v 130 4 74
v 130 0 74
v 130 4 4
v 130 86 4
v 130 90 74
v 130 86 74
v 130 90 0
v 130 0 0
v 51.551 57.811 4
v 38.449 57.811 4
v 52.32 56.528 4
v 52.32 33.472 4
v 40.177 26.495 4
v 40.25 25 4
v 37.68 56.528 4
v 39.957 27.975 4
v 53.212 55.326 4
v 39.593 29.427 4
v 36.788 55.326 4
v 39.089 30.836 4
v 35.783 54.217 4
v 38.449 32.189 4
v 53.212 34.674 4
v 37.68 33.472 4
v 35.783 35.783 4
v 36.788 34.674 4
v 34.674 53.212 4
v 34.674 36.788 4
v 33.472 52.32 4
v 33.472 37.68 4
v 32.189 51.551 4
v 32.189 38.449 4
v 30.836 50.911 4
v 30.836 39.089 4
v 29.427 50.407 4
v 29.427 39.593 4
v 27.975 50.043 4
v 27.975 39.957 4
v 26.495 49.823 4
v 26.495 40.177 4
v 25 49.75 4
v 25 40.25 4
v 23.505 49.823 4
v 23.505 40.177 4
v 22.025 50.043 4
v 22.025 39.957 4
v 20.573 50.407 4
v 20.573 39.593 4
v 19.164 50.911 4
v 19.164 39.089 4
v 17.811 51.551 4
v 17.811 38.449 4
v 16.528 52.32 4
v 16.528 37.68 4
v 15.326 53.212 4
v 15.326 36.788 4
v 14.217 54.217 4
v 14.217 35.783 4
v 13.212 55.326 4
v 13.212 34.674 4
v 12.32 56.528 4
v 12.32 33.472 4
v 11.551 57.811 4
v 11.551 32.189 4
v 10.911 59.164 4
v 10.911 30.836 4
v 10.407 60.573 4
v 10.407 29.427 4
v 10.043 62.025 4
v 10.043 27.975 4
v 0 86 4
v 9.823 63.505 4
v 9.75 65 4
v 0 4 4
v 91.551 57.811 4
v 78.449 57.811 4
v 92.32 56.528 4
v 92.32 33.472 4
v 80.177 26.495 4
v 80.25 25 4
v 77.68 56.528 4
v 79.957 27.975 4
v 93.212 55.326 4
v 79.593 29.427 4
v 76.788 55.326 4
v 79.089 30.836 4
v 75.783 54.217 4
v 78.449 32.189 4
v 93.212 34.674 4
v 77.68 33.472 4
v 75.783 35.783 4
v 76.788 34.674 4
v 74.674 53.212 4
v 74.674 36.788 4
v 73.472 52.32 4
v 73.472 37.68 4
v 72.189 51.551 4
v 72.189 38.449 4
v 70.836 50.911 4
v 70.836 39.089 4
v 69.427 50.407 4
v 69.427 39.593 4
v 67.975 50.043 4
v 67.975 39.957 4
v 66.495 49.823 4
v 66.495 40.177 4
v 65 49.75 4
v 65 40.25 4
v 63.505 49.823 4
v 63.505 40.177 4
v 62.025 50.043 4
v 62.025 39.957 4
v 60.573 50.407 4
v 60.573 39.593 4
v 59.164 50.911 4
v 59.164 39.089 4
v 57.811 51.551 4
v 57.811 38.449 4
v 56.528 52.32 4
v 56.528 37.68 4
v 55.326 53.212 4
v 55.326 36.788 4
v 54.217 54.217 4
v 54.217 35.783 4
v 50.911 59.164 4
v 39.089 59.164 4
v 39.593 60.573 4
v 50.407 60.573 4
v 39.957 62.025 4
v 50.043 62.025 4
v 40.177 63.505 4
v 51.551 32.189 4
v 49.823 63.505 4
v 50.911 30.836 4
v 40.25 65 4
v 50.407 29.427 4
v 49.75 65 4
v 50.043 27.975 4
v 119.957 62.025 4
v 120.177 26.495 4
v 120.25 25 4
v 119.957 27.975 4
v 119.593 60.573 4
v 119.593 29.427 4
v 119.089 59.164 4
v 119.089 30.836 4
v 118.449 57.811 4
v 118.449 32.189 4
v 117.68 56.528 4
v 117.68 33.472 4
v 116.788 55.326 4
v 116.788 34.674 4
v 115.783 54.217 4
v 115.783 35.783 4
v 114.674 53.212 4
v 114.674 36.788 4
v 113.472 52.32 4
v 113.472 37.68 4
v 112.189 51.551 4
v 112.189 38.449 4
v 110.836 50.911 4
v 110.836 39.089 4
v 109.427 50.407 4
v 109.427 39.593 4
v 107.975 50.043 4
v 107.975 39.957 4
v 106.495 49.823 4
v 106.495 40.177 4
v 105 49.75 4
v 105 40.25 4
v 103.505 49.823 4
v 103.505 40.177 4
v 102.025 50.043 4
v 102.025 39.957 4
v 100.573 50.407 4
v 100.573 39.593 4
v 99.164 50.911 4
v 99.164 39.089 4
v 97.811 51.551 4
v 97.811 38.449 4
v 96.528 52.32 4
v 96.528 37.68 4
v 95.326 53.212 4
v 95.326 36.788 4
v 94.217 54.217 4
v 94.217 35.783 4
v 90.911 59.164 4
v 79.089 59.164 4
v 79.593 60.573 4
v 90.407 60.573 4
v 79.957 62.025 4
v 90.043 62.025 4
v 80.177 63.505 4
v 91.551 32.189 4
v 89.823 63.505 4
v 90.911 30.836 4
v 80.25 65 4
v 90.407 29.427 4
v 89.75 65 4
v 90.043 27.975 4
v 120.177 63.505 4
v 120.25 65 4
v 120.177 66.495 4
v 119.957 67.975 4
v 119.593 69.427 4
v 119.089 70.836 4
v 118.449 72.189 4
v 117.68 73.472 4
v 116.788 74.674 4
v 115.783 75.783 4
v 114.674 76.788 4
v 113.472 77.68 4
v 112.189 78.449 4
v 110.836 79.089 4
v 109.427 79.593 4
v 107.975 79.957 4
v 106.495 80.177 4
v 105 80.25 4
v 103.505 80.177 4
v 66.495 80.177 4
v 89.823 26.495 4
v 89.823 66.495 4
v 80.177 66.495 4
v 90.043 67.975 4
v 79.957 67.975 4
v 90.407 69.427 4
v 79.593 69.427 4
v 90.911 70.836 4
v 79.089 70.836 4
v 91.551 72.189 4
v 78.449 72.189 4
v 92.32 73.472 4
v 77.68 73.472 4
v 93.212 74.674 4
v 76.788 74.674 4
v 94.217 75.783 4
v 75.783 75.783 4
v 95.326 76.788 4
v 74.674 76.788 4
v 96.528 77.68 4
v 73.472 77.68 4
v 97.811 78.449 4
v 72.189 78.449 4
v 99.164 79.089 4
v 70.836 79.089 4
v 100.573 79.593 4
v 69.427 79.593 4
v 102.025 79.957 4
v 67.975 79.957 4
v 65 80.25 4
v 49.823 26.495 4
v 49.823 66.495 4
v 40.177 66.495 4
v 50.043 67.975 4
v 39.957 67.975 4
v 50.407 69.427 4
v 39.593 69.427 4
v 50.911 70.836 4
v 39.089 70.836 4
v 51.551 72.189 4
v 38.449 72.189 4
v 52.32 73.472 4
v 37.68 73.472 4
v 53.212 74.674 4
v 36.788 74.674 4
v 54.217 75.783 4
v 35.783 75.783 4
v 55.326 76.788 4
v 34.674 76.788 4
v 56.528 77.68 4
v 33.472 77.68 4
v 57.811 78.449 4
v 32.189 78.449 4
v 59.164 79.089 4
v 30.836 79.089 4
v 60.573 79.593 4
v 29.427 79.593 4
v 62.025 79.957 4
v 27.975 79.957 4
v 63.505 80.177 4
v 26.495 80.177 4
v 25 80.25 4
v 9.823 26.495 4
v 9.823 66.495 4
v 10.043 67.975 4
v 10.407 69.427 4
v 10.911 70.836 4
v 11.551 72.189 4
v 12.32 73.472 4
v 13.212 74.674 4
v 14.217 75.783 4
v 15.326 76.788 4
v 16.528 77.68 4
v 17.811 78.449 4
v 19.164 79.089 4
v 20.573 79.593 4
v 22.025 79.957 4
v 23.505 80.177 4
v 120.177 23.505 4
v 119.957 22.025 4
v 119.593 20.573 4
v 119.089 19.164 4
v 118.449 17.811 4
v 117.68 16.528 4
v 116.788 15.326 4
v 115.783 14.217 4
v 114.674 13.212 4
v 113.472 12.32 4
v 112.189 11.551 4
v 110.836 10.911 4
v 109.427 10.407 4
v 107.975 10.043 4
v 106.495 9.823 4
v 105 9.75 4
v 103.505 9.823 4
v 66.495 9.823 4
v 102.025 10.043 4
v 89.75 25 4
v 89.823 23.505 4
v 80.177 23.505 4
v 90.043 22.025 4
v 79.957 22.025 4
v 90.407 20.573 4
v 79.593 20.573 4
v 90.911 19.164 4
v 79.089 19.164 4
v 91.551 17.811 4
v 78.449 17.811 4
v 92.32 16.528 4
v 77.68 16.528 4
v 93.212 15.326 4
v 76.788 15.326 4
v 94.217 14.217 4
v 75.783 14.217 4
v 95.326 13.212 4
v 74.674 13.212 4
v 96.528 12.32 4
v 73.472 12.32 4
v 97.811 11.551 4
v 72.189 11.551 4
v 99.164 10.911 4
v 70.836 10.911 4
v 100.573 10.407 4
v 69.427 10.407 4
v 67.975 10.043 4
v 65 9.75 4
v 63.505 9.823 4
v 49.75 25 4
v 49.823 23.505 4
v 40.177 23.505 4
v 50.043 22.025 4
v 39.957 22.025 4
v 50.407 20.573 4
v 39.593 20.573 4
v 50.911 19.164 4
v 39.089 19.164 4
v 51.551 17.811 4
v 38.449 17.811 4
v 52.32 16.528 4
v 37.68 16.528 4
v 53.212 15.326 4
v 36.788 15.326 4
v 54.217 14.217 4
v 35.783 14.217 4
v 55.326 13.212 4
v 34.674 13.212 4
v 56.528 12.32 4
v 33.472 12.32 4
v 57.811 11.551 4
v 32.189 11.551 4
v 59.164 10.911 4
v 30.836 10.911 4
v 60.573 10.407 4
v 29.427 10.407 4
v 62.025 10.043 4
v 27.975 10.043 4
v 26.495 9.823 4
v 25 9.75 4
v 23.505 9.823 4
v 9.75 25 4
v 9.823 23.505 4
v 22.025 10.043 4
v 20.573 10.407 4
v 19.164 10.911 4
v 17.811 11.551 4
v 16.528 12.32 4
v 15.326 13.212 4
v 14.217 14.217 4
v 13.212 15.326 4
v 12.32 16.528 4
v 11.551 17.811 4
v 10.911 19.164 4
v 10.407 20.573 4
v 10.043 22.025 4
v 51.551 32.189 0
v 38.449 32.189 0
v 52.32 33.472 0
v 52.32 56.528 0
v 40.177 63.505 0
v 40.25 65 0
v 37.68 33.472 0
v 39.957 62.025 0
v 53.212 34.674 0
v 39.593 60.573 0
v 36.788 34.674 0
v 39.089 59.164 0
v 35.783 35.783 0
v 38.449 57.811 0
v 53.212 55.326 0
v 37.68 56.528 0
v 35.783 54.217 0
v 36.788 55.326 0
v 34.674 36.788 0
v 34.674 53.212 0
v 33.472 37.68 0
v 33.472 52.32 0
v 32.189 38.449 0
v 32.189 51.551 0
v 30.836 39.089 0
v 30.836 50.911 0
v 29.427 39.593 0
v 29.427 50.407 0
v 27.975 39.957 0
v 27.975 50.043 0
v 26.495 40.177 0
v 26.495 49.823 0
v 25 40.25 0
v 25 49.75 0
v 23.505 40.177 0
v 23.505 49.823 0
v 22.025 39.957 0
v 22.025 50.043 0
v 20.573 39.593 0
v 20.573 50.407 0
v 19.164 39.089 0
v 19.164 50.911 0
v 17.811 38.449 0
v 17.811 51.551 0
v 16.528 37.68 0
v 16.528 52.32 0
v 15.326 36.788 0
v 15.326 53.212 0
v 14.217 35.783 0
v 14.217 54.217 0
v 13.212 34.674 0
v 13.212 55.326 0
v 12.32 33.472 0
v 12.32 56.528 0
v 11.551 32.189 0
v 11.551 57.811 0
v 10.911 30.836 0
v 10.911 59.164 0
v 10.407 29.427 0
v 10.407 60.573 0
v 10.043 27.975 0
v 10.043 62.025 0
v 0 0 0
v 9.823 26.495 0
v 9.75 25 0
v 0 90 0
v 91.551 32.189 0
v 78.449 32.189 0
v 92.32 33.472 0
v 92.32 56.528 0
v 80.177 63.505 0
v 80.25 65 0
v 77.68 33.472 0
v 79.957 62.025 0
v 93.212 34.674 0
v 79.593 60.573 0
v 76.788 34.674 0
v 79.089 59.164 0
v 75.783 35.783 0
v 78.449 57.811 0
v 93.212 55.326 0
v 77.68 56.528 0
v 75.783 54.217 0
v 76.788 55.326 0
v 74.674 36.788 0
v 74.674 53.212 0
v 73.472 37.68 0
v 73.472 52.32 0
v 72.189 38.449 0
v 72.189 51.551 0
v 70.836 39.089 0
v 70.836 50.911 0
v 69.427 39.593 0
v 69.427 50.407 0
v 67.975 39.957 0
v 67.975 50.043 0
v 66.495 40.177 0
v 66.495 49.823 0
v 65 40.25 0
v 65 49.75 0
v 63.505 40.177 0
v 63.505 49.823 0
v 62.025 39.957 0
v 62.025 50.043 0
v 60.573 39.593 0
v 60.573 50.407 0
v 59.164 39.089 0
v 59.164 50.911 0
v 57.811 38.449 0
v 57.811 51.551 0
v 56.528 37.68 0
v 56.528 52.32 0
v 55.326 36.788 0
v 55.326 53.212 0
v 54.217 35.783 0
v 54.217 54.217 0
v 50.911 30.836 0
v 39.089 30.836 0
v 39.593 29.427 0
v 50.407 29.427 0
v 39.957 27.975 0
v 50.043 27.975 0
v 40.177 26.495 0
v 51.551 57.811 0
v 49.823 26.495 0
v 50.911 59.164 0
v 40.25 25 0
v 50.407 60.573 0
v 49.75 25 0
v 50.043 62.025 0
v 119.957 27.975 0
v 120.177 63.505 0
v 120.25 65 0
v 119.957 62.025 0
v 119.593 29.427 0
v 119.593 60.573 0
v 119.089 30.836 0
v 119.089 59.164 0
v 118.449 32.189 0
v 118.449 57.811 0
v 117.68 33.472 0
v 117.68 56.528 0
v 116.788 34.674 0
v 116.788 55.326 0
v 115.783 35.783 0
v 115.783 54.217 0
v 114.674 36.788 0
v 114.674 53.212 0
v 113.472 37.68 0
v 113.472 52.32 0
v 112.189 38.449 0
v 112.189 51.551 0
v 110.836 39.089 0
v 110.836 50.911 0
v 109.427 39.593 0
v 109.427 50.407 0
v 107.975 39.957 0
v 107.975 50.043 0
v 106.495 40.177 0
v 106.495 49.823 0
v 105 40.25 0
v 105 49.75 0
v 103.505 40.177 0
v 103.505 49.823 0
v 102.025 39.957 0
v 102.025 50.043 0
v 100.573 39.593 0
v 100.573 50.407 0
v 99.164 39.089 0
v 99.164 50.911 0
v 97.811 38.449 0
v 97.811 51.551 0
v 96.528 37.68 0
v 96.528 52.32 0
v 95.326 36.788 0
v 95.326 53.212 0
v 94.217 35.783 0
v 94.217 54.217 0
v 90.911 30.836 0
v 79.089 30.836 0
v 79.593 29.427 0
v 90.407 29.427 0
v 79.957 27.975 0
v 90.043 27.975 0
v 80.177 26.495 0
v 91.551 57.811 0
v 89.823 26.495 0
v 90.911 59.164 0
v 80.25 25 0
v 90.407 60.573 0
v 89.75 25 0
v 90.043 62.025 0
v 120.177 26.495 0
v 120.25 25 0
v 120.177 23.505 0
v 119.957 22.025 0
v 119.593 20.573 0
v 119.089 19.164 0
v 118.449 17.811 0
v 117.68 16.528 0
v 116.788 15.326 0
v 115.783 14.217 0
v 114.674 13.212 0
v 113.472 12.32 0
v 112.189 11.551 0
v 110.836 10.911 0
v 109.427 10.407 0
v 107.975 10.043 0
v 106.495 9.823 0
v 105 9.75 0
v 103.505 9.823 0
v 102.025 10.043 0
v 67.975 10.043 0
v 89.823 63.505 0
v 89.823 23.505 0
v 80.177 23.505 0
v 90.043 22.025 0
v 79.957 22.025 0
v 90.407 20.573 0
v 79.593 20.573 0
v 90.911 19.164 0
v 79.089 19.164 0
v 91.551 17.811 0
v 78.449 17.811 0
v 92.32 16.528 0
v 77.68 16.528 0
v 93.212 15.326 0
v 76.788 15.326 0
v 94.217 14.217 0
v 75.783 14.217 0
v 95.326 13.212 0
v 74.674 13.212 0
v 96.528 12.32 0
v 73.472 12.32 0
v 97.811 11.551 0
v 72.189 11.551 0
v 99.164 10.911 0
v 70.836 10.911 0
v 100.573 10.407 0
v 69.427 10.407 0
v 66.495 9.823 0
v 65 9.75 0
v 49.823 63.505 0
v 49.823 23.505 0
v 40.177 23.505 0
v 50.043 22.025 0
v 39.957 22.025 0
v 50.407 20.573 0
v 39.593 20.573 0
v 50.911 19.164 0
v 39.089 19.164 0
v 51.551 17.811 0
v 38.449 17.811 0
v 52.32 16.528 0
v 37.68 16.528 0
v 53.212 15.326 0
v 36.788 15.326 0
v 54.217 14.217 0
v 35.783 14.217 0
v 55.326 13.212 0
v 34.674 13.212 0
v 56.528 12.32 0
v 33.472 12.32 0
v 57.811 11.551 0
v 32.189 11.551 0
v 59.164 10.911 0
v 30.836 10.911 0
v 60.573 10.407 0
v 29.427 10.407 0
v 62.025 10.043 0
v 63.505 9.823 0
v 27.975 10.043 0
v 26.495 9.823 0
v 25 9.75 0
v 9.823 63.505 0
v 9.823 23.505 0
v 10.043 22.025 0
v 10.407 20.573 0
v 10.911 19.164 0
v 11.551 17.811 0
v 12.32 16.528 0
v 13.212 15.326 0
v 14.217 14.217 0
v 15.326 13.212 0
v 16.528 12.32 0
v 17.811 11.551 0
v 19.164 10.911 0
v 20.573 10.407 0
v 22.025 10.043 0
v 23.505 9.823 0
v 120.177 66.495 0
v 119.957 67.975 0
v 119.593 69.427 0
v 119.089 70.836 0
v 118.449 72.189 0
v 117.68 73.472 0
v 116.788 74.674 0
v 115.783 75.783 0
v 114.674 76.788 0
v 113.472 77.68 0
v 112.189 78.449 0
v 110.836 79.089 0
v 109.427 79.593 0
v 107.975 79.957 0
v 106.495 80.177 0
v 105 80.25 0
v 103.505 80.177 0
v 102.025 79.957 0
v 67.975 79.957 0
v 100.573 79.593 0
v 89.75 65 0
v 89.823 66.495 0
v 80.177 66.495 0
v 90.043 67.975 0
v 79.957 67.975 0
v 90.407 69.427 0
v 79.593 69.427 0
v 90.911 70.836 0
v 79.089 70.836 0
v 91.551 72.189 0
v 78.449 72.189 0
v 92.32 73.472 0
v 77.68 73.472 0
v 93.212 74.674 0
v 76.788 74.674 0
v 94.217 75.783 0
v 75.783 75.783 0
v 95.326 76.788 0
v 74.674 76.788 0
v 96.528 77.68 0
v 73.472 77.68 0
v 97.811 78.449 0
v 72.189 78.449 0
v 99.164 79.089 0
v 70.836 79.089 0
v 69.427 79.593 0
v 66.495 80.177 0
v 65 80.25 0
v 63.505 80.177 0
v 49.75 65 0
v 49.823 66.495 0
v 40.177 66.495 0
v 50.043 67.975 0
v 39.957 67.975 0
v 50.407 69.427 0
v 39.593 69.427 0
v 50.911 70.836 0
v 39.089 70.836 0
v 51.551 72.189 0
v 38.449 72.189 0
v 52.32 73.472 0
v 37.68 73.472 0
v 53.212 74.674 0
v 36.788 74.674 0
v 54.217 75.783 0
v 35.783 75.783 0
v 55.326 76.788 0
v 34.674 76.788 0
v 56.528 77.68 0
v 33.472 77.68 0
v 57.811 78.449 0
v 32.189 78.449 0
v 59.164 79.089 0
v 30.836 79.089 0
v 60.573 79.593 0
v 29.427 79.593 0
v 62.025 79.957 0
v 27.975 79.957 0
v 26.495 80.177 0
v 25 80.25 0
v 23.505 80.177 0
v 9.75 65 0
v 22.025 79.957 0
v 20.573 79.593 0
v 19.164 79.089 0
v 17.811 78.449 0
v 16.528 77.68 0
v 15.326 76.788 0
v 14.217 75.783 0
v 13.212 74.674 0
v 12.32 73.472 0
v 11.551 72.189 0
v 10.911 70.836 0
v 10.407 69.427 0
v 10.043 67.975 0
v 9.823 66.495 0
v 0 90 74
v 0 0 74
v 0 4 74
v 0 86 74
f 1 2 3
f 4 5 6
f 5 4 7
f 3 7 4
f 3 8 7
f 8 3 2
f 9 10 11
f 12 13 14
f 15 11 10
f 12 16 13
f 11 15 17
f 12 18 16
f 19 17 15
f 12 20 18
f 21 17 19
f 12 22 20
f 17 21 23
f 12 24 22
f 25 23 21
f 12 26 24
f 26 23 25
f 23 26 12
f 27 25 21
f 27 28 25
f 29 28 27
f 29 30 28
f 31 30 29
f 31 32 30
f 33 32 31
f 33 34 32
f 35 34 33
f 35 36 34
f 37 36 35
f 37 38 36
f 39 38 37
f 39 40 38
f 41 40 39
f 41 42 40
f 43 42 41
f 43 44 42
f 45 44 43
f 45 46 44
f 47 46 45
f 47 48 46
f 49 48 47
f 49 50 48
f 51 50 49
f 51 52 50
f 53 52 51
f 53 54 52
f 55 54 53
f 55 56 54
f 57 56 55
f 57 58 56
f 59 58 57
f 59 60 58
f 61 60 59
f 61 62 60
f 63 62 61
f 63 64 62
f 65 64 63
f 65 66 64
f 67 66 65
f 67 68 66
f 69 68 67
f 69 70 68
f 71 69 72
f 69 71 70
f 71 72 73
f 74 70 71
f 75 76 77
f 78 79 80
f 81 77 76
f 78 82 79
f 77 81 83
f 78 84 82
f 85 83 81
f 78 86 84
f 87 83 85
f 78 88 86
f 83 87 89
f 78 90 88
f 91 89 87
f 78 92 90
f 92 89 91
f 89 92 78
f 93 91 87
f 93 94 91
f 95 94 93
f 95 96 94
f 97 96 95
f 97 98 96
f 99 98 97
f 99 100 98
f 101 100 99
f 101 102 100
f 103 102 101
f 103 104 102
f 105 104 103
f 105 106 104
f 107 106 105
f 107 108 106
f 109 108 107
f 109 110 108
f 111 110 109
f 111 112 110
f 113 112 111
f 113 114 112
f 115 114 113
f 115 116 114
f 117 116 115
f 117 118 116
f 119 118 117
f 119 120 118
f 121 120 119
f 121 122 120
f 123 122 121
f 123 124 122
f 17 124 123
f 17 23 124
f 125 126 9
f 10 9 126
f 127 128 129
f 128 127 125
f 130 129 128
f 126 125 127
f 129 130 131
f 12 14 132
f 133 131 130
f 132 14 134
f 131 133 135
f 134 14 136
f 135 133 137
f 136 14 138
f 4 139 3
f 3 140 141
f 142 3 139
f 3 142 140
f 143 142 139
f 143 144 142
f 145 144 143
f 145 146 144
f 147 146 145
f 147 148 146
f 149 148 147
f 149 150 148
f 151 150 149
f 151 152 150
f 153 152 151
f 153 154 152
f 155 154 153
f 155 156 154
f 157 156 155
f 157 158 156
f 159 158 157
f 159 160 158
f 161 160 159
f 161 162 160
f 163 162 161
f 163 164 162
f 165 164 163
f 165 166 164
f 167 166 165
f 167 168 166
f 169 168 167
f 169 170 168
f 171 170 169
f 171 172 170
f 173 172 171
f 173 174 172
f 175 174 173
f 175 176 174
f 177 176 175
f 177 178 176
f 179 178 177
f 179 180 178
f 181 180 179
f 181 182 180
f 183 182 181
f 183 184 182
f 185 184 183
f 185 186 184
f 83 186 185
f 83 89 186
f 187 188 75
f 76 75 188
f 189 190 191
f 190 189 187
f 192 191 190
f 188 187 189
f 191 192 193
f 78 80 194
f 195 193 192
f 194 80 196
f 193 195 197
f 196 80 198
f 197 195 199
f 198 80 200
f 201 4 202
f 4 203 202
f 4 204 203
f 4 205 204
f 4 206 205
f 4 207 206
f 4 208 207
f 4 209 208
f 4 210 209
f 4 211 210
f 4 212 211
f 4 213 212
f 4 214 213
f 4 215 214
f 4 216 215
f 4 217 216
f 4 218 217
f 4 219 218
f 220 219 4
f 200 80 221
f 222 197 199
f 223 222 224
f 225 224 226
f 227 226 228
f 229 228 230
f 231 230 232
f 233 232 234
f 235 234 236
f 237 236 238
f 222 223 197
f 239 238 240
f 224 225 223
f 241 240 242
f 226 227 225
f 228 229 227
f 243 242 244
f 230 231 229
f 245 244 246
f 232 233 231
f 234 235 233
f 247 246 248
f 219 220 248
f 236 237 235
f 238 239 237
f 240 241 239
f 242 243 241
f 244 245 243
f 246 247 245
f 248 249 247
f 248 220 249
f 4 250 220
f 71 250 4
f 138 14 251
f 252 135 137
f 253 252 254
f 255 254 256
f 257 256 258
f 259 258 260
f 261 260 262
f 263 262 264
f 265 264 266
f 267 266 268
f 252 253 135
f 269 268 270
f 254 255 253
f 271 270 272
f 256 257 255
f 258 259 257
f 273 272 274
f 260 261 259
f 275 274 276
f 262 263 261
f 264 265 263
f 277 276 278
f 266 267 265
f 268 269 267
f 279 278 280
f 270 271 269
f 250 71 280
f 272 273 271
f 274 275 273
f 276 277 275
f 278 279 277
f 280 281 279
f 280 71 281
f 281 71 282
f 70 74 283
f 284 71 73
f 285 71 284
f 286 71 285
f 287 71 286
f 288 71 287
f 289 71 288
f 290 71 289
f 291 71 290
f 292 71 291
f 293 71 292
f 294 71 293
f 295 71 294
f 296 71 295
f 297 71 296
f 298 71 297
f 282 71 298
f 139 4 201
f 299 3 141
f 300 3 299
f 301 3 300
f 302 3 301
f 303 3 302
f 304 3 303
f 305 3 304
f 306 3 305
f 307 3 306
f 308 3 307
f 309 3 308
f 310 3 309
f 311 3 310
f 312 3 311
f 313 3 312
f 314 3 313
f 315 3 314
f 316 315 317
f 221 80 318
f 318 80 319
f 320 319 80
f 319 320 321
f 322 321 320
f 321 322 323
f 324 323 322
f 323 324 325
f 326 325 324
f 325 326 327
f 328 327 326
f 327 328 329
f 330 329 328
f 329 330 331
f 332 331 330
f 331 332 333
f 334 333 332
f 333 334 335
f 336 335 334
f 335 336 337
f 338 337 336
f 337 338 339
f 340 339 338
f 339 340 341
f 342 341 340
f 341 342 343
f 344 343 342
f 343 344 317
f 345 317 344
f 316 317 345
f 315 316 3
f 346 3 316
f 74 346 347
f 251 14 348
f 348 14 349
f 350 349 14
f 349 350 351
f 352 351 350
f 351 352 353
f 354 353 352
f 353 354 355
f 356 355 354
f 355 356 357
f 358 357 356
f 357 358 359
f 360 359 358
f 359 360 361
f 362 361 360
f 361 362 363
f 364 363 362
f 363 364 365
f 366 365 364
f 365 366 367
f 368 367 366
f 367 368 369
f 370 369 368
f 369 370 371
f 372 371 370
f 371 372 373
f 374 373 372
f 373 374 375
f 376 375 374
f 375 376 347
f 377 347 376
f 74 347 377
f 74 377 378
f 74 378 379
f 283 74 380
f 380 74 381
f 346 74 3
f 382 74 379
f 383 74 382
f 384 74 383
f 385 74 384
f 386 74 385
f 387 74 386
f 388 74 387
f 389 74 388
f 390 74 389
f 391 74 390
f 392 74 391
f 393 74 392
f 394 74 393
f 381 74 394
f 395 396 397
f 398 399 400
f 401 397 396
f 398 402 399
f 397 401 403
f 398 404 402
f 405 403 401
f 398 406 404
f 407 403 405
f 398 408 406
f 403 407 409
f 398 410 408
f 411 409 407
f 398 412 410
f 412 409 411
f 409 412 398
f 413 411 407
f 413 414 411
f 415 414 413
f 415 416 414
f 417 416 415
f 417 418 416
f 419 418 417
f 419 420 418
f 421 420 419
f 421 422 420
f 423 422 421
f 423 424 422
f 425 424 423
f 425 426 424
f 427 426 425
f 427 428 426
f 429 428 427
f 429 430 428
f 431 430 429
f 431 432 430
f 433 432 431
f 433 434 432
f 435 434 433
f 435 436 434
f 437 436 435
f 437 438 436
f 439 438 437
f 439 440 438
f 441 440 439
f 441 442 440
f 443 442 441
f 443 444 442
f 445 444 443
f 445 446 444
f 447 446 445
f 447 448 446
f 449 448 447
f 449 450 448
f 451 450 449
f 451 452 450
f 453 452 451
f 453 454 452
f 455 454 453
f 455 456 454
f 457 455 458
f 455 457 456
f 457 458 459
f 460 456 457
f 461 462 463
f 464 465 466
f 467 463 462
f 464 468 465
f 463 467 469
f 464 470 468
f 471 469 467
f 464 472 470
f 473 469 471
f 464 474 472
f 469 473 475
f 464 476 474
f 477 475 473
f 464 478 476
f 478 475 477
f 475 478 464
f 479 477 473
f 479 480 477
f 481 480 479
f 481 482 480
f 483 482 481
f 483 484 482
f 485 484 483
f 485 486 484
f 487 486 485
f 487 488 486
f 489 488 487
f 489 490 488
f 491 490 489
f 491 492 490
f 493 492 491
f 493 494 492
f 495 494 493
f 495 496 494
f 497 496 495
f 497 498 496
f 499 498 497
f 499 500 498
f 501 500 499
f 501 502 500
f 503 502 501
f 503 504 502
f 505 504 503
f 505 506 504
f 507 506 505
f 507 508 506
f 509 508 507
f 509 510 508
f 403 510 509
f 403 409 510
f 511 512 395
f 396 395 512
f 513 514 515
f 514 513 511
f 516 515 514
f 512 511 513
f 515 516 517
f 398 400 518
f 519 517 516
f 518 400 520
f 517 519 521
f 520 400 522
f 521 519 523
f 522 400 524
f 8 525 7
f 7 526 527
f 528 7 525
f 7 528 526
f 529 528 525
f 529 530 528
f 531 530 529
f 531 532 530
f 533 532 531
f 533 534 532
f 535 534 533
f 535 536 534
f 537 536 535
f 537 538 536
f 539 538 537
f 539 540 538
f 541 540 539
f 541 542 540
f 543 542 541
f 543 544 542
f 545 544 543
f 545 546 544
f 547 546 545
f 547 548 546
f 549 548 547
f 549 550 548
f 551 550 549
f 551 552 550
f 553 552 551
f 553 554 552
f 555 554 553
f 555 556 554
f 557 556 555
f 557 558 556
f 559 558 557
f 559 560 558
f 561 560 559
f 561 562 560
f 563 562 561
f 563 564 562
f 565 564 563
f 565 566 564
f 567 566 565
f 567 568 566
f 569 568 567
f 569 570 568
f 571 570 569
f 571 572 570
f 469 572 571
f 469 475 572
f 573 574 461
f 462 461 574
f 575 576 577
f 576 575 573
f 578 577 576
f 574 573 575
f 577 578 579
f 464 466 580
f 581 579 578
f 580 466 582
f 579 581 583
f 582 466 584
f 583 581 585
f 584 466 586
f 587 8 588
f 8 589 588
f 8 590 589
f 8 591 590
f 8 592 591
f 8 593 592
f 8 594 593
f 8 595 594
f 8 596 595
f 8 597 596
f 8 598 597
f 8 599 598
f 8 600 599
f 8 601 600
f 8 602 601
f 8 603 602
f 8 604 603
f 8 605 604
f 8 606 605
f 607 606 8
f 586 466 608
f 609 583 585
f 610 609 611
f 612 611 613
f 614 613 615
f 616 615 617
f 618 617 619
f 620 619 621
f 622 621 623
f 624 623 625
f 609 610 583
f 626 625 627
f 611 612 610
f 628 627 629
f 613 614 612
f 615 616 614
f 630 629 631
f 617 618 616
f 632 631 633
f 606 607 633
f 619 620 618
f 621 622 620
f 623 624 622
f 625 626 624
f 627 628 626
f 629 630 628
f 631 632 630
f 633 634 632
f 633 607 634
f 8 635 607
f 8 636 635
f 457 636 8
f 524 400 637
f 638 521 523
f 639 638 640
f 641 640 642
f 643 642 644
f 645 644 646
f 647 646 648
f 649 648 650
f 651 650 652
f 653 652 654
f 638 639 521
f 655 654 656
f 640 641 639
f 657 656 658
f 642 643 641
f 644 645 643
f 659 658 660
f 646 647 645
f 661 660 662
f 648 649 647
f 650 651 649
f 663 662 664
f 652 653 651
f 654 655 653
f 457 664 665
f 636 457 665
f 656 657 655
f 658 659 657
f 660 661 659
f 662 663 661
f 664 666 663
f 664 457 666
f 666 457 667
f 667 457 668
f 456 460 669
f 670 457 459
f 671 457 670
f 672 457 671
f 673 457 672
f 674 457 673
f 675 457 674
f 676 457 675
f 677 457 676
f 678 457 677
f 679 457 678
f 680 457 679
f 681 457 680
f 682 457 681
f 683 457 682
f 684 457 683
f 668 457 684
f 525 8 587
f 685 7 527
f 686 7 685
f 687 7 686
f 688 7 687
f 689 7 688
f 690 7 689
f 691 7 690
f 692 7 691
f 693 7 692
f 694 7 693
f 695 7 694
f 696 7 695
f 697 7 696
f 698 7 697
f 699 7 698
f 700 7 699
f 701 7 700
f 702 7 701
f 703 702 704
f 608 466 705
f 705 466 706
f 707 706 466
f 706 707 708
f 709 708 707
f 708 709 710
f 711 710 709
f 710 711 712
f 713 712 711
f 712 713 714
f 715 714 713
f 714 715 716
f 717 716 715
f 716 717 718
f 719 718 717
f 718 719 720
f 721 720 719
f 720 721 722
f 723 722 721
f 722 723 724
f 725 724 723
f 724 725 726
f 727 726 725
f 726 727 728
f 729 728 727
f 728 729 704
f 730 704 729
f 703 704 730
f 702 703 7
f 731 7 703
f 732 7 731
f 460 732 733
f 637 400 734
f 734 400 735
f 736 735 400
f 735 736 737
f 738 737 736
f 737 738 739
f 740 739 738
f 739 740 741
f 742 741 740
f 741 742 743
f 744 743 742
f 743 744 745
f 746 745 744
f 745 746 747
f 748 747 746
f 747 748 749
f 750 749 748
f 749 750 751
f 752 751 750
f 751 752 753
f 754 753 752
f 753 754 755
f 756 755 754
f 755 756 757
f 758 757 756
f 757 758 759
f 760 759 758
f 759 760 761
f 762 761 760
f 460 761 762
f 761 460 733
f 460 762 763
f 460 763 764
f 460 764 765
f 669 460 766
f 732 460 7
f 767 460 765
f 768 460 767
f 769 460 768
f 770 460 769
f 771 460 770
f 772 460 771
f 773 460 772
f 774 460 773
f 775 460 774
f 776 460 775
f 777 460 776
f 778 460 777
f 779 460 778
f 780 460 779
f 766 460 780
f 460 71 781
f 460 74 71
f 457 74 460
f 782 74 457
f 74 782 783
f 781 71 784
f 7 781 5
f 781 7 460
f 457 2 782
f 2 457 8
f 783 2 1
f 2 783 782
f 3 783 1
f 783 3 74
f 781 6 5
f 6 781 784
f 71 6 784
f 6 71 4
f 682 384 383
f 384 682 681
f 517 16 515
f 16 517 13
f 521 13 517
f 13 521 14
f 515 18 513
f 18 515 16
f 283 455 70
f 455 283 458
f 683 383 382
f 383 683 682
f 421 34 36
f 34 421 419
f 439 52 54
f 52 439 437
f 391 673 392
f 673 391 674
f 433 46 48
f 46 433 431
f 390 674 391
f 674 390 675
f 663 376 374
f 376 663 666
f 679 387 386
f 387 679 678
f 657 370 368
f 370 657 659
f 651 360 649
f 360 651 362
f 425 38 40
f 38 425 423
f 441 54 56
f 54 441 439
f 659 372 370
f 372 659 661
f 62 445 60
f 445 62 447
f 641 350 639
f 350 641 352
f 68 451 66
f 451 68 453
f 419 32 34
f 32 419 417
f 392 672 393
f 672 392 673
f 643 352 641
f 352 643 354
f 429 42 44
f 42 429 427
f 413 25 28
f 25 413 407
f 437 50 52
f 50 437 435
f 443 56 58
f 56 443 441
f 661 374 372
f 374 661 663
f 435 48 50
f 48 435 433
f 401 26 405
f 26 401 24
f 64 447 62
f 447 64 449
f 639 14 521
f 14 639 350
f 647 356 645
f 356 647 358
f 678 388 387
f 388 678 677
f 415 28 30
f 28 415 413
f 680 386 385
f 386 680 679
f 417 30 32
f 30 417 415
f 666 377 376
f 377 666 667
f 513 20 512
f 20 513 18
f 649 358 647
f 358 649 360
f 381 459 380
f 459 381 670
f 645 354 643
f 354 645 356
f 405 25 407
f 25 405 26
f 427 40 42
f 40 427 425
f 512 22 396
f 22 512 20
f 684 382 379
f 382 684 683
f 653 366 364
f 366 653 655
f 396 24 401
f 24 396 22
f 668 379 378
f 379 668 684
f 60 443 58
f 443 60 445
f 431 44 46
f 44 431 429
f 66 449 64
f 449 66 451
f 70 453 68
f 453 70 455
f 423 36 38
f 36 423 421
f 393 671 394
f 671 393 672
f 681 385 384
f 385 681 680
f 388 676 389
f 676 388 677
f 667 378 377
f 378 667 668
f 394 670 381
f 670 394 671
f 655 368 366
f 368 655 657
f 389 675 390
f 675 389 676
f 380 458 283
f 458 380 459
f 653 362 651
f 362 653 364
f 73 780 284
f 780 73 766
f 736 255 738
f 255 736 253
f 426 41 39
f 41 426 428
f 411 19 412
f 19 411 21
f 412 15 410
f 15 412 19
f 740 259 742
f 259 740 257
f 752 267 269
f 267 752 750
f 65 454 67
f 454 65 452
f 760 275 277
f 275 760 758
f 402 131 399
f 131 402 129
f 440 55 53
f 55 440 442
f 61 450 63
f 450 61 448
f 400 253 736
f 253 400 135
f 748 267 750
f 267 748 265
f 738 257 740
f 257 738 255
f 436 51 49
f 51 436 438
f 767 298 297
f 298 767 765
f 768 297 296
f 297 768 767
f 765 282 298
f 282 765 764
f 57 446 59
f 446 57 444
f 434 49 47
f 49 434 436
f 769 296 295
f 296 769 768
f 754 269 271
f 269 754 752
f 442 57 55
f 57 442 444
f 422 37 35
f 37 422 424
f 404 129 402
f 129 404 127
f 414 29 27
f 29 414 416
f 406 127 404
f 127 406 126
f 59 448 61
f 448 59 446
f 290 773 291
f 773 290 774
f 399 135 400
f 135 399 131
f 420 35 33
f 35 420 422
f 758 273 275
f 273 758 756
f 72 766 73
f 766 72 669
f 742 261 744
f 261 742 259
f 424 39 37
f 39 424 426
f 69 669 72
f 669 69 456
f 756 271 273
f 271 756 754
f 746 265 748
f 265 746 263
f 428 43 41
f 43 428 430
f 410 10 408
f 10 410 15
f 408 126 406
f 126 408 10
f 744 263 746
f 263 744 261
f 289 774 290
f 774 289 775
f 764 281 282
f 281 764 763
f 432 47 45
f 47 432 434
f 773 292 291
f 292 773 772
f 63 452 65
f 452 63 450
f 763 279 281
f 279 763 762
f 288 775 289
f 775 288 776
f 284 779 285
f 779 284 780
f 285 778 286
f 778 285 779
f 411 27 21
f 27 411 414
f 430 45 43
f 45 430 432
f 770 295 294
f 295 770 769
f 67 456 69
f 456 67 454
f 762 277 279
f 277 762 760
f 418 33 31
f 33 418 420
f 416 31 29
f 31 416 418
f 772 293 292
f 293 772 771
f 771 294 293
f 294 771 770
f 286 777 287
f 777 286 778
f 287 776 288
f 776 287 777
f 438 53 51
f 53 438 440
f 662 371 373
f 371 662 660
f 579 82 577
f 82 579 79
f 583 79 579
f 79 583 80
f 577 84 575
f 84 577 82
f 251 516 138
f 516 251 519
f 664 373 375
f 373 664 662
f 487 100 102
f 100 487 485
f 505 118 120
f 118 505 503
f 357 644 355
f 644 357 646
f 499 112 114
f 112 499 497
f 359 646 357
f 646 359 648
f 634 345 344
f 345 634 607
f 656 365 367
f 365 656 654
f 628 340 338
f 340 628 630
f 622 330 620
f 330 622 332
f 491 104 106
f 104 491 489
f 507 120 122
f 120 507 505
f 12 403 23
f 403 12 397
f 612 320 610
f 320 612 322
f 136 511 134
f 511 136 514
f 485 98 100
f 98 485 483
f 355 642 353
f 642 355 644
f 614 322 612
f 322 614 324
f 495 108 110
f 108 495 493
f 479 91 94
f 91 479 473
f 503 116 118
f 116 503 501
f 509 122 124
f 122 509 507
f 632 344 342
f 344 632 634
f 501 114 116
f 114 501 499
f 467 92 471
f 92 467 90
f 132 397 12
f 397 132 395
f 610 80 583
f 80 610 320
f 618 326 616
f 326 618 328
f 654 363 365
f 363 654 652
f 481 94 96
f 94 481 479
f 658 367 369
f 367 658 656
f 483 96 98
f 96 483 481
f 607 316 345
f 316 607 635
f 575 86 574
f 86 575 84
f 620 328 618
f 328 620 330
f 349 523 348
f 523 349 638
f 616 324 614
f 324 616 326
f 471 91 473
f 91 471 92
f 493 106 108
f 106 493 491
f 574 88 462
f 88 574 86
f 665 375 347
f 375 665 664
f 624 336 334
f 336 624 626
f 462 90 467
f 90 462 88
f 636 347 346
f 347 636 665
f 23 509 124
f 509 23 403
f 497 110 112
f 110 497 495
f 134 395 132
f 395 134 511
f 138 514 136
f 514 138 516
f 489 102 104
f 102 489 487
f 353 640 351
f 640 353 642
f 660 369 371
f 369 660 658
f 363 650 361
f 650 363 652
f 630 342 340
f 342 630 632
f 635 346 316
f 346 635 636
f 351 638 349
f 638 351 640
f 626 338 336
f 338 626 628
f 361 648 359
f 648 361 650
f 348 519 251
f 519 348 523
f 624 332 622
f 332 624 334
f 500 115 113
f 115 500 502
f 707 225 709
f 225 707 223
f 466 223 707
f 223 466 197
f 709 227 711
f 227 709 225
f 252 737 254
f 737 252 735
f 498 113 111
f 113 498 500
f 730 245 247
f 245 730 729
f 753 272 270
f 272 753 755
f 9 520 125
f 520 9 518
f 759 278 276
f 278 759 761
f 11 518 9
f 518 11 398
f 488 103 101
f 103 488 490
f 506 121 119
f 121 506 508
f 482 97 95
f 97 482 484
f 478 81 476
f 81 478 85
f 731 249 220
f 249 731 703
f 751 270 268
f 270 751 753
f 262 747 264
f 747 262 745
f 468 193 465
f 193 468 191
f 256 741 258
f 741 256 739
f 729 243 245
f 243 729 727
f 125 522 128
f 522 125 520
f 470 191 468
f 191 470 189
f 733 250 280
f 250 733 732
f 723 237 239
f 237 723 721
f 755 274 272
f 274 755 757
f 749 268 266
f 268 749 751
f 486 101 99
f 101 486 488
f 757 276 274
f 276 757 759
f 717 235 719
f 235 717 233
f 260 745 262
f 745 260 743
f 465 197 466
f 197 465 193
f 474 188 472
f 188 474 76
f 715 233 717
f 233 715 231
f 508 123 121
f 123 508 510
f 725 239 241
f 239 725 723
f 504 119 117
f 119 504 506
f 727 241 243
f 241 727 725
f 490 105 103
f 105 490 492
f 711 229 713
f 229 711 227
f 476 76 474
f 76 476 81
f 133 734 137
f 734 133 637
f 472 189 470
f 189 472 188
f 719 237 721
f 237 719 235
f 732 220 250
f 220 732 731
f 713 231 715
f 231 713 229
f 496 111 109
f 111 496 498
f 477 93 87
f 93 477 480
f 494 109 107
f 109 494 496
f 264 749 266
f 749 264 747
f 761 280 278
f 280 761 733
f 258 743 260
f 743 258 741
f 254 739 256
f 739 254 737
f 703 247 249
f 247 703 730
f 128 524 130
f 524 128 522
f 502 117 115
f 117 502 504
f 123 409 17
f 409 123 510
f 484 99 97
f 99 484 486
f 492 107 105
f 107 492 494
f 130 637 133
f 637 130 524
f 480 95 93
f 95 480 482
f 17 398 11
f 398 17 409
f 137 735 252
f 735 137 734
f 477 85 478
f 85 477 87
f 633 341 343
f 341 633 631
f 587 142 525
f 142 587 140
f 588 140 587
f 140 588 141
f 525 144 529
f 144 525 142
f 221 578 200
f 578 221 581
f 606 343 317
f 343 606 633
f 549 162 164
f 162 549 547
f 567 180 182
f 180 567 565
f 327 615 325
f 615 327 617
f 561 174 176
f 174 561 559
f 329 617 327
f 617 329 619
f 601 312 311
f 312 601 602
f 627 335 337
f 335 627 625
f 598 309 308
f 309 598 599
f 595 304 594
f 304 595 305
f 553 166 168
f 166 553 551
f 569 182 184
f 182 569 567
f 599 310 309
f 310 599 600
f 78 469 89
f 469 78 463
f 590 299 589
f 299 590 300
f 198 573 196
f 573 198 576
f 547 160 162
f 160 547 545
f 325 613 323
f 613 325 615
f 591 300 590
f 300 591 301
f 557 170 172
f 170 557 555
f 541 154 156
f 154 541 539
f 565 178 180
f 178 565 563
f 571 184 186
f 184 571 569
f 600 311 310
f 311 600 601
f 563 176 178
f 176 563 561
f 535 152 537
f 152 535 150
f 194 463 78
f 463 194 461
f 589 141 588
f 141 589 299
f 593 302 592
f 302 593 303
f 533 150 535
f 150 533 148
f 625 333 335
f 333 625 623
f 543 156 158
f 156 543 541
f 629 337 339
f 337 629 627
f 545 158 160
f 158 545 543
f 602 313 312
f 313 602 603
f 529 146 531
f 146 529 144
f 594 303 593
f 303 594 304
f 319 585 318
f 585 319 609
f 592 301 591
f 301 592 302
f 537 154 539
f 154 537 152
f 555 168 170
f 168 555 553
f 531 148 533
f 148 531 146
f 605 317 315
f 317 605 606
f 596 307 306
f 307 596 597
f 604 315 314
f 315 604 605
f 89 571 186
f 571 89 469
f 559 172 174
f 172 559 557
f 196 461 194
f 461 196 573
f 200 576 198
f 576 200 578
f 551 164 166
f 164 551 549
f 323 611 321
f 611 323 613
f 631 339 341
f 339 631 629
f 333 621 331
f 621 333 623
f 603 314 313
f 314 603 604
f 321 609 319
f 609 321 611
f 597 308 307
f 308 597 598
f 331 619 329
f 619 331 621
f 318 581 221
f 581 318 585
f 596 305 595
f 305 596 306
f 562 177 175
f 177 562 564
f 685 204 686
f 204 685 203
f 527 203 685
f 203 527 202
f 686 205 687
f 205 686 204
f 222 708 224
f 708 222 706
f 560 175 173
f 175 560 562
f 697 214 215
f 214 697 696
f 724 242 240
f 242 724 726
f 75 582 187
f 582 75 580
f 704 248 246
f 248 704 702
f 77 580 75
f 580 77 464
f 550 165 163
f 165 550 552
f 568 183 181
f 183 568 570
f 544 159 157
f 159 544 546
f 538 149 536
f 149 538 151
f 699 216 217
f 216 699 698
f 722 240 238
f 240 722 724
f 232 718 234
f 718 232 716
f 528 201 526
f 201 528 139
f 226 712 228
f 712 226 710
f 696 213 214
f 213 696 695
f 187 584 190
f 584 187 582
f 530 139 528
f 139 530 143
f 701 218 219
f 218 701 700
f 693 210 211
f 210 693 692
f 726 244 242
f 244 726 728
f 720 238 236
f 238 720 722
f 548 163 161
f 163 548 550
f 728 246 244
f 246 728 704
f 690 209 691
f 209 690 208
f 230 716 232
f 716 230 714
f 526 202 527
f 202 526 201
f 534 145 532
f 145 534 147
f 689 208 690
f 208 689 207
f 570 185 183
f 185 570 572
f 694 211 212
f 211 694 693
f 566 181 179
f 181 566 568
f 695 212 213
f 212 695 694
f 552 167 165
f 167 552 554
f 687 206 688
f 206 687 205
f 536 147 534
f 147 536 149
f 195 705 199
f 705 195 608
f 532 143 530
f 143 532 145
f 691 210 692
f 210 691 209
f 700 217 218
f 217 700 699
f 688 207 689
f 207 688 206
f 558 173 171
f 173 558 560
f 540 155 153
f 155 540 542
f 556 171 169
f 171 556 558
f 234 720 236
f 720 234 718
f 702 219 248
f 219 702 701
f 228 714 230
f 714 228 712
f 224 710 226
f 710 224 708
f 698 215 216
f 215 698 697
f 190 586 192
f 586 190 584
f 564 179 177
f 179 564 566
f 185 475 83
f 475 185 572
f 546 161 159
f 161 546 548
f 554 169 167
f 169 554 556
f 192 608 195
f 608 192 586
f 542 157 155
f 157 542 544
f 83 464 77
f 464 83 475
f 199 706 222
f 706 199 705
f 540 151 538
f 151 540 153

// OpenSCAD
// --- Dimensions (mm) ---
plate_width = 130;          // X dimension of the base plate
plate_depth = 90;           // Y dimension of the base plate
plate_thickness = 4;        // Thickness of the base plate
wall_height = 70;           // Height of the side walls from the plate
wall_thickness = 4;         // Thickness of the side walls
hole_diameter = 30.5;       // Diameter of the tube holes
hole_spacing_x = 40;        // Center-to-center distance along X
hole_spacing_y = 40;        // Center-to-center distance along Y
num_holes_x = 3;            // Number of holes along X axis
num_holes_y = 2;            // Number of holes along Y axis

// --- Resolution ---
$fn = 64;

// --- Construction ---

// The part is designed to be printed "upside down" relative to its final use.
// In print orientation: 
// The plate is at Z=0 to Z=4.
// The walls rise from Z=4 to Z=70.
// The holes are cut through the plate.

module tube_rack() {
    difference() {
        // Main Body: The plate and the two side walls
        union() {
            // The Base Plate
            cube([plate_width, plate_depth, plate_thickness]);
            
            // Wall 1 (along one long edge)
            translate([0, 0, plate_thickness])
                cube([plate_width, wall_thickness, wall_height]);
            
            // Wall 2 (along the other long edge)
            translate([0, plate_depth - wall_thickness, plate_thickness])
                cube([plate_width, wall_thickness, wall_height]);
        }

        // The Holes
        // We calculate the starting position to center the grid on the plate
        // Grid center is at (plate_width/2, plate_depth/2)
        // Offset calculation: (Total_spacing - (count-1)*spacing) / 2
        
        start_x = (plate_width - (num_holes_x - 1) * hole_spacing_x) / 2;
        start_y = (plate_depth - (num_holes_y - 1) * hole_spacing_y) / 2;

        for (i = [0 : num_holes_x - 1]) {
            for (j = [0 : num_holes_y - 1]) {
                translate([
                    start_x + i * hole_spacing_x, 
                    start_y + j * hole_spacing_y, 
                    -0.01 // Slight overlap to ensure clean cut through bottom
                ])
                cylinder(d = hole_diameter, h = plate_thickness + 0.02);
            }
        }
    }
}

// Render the part
tube_rack();
